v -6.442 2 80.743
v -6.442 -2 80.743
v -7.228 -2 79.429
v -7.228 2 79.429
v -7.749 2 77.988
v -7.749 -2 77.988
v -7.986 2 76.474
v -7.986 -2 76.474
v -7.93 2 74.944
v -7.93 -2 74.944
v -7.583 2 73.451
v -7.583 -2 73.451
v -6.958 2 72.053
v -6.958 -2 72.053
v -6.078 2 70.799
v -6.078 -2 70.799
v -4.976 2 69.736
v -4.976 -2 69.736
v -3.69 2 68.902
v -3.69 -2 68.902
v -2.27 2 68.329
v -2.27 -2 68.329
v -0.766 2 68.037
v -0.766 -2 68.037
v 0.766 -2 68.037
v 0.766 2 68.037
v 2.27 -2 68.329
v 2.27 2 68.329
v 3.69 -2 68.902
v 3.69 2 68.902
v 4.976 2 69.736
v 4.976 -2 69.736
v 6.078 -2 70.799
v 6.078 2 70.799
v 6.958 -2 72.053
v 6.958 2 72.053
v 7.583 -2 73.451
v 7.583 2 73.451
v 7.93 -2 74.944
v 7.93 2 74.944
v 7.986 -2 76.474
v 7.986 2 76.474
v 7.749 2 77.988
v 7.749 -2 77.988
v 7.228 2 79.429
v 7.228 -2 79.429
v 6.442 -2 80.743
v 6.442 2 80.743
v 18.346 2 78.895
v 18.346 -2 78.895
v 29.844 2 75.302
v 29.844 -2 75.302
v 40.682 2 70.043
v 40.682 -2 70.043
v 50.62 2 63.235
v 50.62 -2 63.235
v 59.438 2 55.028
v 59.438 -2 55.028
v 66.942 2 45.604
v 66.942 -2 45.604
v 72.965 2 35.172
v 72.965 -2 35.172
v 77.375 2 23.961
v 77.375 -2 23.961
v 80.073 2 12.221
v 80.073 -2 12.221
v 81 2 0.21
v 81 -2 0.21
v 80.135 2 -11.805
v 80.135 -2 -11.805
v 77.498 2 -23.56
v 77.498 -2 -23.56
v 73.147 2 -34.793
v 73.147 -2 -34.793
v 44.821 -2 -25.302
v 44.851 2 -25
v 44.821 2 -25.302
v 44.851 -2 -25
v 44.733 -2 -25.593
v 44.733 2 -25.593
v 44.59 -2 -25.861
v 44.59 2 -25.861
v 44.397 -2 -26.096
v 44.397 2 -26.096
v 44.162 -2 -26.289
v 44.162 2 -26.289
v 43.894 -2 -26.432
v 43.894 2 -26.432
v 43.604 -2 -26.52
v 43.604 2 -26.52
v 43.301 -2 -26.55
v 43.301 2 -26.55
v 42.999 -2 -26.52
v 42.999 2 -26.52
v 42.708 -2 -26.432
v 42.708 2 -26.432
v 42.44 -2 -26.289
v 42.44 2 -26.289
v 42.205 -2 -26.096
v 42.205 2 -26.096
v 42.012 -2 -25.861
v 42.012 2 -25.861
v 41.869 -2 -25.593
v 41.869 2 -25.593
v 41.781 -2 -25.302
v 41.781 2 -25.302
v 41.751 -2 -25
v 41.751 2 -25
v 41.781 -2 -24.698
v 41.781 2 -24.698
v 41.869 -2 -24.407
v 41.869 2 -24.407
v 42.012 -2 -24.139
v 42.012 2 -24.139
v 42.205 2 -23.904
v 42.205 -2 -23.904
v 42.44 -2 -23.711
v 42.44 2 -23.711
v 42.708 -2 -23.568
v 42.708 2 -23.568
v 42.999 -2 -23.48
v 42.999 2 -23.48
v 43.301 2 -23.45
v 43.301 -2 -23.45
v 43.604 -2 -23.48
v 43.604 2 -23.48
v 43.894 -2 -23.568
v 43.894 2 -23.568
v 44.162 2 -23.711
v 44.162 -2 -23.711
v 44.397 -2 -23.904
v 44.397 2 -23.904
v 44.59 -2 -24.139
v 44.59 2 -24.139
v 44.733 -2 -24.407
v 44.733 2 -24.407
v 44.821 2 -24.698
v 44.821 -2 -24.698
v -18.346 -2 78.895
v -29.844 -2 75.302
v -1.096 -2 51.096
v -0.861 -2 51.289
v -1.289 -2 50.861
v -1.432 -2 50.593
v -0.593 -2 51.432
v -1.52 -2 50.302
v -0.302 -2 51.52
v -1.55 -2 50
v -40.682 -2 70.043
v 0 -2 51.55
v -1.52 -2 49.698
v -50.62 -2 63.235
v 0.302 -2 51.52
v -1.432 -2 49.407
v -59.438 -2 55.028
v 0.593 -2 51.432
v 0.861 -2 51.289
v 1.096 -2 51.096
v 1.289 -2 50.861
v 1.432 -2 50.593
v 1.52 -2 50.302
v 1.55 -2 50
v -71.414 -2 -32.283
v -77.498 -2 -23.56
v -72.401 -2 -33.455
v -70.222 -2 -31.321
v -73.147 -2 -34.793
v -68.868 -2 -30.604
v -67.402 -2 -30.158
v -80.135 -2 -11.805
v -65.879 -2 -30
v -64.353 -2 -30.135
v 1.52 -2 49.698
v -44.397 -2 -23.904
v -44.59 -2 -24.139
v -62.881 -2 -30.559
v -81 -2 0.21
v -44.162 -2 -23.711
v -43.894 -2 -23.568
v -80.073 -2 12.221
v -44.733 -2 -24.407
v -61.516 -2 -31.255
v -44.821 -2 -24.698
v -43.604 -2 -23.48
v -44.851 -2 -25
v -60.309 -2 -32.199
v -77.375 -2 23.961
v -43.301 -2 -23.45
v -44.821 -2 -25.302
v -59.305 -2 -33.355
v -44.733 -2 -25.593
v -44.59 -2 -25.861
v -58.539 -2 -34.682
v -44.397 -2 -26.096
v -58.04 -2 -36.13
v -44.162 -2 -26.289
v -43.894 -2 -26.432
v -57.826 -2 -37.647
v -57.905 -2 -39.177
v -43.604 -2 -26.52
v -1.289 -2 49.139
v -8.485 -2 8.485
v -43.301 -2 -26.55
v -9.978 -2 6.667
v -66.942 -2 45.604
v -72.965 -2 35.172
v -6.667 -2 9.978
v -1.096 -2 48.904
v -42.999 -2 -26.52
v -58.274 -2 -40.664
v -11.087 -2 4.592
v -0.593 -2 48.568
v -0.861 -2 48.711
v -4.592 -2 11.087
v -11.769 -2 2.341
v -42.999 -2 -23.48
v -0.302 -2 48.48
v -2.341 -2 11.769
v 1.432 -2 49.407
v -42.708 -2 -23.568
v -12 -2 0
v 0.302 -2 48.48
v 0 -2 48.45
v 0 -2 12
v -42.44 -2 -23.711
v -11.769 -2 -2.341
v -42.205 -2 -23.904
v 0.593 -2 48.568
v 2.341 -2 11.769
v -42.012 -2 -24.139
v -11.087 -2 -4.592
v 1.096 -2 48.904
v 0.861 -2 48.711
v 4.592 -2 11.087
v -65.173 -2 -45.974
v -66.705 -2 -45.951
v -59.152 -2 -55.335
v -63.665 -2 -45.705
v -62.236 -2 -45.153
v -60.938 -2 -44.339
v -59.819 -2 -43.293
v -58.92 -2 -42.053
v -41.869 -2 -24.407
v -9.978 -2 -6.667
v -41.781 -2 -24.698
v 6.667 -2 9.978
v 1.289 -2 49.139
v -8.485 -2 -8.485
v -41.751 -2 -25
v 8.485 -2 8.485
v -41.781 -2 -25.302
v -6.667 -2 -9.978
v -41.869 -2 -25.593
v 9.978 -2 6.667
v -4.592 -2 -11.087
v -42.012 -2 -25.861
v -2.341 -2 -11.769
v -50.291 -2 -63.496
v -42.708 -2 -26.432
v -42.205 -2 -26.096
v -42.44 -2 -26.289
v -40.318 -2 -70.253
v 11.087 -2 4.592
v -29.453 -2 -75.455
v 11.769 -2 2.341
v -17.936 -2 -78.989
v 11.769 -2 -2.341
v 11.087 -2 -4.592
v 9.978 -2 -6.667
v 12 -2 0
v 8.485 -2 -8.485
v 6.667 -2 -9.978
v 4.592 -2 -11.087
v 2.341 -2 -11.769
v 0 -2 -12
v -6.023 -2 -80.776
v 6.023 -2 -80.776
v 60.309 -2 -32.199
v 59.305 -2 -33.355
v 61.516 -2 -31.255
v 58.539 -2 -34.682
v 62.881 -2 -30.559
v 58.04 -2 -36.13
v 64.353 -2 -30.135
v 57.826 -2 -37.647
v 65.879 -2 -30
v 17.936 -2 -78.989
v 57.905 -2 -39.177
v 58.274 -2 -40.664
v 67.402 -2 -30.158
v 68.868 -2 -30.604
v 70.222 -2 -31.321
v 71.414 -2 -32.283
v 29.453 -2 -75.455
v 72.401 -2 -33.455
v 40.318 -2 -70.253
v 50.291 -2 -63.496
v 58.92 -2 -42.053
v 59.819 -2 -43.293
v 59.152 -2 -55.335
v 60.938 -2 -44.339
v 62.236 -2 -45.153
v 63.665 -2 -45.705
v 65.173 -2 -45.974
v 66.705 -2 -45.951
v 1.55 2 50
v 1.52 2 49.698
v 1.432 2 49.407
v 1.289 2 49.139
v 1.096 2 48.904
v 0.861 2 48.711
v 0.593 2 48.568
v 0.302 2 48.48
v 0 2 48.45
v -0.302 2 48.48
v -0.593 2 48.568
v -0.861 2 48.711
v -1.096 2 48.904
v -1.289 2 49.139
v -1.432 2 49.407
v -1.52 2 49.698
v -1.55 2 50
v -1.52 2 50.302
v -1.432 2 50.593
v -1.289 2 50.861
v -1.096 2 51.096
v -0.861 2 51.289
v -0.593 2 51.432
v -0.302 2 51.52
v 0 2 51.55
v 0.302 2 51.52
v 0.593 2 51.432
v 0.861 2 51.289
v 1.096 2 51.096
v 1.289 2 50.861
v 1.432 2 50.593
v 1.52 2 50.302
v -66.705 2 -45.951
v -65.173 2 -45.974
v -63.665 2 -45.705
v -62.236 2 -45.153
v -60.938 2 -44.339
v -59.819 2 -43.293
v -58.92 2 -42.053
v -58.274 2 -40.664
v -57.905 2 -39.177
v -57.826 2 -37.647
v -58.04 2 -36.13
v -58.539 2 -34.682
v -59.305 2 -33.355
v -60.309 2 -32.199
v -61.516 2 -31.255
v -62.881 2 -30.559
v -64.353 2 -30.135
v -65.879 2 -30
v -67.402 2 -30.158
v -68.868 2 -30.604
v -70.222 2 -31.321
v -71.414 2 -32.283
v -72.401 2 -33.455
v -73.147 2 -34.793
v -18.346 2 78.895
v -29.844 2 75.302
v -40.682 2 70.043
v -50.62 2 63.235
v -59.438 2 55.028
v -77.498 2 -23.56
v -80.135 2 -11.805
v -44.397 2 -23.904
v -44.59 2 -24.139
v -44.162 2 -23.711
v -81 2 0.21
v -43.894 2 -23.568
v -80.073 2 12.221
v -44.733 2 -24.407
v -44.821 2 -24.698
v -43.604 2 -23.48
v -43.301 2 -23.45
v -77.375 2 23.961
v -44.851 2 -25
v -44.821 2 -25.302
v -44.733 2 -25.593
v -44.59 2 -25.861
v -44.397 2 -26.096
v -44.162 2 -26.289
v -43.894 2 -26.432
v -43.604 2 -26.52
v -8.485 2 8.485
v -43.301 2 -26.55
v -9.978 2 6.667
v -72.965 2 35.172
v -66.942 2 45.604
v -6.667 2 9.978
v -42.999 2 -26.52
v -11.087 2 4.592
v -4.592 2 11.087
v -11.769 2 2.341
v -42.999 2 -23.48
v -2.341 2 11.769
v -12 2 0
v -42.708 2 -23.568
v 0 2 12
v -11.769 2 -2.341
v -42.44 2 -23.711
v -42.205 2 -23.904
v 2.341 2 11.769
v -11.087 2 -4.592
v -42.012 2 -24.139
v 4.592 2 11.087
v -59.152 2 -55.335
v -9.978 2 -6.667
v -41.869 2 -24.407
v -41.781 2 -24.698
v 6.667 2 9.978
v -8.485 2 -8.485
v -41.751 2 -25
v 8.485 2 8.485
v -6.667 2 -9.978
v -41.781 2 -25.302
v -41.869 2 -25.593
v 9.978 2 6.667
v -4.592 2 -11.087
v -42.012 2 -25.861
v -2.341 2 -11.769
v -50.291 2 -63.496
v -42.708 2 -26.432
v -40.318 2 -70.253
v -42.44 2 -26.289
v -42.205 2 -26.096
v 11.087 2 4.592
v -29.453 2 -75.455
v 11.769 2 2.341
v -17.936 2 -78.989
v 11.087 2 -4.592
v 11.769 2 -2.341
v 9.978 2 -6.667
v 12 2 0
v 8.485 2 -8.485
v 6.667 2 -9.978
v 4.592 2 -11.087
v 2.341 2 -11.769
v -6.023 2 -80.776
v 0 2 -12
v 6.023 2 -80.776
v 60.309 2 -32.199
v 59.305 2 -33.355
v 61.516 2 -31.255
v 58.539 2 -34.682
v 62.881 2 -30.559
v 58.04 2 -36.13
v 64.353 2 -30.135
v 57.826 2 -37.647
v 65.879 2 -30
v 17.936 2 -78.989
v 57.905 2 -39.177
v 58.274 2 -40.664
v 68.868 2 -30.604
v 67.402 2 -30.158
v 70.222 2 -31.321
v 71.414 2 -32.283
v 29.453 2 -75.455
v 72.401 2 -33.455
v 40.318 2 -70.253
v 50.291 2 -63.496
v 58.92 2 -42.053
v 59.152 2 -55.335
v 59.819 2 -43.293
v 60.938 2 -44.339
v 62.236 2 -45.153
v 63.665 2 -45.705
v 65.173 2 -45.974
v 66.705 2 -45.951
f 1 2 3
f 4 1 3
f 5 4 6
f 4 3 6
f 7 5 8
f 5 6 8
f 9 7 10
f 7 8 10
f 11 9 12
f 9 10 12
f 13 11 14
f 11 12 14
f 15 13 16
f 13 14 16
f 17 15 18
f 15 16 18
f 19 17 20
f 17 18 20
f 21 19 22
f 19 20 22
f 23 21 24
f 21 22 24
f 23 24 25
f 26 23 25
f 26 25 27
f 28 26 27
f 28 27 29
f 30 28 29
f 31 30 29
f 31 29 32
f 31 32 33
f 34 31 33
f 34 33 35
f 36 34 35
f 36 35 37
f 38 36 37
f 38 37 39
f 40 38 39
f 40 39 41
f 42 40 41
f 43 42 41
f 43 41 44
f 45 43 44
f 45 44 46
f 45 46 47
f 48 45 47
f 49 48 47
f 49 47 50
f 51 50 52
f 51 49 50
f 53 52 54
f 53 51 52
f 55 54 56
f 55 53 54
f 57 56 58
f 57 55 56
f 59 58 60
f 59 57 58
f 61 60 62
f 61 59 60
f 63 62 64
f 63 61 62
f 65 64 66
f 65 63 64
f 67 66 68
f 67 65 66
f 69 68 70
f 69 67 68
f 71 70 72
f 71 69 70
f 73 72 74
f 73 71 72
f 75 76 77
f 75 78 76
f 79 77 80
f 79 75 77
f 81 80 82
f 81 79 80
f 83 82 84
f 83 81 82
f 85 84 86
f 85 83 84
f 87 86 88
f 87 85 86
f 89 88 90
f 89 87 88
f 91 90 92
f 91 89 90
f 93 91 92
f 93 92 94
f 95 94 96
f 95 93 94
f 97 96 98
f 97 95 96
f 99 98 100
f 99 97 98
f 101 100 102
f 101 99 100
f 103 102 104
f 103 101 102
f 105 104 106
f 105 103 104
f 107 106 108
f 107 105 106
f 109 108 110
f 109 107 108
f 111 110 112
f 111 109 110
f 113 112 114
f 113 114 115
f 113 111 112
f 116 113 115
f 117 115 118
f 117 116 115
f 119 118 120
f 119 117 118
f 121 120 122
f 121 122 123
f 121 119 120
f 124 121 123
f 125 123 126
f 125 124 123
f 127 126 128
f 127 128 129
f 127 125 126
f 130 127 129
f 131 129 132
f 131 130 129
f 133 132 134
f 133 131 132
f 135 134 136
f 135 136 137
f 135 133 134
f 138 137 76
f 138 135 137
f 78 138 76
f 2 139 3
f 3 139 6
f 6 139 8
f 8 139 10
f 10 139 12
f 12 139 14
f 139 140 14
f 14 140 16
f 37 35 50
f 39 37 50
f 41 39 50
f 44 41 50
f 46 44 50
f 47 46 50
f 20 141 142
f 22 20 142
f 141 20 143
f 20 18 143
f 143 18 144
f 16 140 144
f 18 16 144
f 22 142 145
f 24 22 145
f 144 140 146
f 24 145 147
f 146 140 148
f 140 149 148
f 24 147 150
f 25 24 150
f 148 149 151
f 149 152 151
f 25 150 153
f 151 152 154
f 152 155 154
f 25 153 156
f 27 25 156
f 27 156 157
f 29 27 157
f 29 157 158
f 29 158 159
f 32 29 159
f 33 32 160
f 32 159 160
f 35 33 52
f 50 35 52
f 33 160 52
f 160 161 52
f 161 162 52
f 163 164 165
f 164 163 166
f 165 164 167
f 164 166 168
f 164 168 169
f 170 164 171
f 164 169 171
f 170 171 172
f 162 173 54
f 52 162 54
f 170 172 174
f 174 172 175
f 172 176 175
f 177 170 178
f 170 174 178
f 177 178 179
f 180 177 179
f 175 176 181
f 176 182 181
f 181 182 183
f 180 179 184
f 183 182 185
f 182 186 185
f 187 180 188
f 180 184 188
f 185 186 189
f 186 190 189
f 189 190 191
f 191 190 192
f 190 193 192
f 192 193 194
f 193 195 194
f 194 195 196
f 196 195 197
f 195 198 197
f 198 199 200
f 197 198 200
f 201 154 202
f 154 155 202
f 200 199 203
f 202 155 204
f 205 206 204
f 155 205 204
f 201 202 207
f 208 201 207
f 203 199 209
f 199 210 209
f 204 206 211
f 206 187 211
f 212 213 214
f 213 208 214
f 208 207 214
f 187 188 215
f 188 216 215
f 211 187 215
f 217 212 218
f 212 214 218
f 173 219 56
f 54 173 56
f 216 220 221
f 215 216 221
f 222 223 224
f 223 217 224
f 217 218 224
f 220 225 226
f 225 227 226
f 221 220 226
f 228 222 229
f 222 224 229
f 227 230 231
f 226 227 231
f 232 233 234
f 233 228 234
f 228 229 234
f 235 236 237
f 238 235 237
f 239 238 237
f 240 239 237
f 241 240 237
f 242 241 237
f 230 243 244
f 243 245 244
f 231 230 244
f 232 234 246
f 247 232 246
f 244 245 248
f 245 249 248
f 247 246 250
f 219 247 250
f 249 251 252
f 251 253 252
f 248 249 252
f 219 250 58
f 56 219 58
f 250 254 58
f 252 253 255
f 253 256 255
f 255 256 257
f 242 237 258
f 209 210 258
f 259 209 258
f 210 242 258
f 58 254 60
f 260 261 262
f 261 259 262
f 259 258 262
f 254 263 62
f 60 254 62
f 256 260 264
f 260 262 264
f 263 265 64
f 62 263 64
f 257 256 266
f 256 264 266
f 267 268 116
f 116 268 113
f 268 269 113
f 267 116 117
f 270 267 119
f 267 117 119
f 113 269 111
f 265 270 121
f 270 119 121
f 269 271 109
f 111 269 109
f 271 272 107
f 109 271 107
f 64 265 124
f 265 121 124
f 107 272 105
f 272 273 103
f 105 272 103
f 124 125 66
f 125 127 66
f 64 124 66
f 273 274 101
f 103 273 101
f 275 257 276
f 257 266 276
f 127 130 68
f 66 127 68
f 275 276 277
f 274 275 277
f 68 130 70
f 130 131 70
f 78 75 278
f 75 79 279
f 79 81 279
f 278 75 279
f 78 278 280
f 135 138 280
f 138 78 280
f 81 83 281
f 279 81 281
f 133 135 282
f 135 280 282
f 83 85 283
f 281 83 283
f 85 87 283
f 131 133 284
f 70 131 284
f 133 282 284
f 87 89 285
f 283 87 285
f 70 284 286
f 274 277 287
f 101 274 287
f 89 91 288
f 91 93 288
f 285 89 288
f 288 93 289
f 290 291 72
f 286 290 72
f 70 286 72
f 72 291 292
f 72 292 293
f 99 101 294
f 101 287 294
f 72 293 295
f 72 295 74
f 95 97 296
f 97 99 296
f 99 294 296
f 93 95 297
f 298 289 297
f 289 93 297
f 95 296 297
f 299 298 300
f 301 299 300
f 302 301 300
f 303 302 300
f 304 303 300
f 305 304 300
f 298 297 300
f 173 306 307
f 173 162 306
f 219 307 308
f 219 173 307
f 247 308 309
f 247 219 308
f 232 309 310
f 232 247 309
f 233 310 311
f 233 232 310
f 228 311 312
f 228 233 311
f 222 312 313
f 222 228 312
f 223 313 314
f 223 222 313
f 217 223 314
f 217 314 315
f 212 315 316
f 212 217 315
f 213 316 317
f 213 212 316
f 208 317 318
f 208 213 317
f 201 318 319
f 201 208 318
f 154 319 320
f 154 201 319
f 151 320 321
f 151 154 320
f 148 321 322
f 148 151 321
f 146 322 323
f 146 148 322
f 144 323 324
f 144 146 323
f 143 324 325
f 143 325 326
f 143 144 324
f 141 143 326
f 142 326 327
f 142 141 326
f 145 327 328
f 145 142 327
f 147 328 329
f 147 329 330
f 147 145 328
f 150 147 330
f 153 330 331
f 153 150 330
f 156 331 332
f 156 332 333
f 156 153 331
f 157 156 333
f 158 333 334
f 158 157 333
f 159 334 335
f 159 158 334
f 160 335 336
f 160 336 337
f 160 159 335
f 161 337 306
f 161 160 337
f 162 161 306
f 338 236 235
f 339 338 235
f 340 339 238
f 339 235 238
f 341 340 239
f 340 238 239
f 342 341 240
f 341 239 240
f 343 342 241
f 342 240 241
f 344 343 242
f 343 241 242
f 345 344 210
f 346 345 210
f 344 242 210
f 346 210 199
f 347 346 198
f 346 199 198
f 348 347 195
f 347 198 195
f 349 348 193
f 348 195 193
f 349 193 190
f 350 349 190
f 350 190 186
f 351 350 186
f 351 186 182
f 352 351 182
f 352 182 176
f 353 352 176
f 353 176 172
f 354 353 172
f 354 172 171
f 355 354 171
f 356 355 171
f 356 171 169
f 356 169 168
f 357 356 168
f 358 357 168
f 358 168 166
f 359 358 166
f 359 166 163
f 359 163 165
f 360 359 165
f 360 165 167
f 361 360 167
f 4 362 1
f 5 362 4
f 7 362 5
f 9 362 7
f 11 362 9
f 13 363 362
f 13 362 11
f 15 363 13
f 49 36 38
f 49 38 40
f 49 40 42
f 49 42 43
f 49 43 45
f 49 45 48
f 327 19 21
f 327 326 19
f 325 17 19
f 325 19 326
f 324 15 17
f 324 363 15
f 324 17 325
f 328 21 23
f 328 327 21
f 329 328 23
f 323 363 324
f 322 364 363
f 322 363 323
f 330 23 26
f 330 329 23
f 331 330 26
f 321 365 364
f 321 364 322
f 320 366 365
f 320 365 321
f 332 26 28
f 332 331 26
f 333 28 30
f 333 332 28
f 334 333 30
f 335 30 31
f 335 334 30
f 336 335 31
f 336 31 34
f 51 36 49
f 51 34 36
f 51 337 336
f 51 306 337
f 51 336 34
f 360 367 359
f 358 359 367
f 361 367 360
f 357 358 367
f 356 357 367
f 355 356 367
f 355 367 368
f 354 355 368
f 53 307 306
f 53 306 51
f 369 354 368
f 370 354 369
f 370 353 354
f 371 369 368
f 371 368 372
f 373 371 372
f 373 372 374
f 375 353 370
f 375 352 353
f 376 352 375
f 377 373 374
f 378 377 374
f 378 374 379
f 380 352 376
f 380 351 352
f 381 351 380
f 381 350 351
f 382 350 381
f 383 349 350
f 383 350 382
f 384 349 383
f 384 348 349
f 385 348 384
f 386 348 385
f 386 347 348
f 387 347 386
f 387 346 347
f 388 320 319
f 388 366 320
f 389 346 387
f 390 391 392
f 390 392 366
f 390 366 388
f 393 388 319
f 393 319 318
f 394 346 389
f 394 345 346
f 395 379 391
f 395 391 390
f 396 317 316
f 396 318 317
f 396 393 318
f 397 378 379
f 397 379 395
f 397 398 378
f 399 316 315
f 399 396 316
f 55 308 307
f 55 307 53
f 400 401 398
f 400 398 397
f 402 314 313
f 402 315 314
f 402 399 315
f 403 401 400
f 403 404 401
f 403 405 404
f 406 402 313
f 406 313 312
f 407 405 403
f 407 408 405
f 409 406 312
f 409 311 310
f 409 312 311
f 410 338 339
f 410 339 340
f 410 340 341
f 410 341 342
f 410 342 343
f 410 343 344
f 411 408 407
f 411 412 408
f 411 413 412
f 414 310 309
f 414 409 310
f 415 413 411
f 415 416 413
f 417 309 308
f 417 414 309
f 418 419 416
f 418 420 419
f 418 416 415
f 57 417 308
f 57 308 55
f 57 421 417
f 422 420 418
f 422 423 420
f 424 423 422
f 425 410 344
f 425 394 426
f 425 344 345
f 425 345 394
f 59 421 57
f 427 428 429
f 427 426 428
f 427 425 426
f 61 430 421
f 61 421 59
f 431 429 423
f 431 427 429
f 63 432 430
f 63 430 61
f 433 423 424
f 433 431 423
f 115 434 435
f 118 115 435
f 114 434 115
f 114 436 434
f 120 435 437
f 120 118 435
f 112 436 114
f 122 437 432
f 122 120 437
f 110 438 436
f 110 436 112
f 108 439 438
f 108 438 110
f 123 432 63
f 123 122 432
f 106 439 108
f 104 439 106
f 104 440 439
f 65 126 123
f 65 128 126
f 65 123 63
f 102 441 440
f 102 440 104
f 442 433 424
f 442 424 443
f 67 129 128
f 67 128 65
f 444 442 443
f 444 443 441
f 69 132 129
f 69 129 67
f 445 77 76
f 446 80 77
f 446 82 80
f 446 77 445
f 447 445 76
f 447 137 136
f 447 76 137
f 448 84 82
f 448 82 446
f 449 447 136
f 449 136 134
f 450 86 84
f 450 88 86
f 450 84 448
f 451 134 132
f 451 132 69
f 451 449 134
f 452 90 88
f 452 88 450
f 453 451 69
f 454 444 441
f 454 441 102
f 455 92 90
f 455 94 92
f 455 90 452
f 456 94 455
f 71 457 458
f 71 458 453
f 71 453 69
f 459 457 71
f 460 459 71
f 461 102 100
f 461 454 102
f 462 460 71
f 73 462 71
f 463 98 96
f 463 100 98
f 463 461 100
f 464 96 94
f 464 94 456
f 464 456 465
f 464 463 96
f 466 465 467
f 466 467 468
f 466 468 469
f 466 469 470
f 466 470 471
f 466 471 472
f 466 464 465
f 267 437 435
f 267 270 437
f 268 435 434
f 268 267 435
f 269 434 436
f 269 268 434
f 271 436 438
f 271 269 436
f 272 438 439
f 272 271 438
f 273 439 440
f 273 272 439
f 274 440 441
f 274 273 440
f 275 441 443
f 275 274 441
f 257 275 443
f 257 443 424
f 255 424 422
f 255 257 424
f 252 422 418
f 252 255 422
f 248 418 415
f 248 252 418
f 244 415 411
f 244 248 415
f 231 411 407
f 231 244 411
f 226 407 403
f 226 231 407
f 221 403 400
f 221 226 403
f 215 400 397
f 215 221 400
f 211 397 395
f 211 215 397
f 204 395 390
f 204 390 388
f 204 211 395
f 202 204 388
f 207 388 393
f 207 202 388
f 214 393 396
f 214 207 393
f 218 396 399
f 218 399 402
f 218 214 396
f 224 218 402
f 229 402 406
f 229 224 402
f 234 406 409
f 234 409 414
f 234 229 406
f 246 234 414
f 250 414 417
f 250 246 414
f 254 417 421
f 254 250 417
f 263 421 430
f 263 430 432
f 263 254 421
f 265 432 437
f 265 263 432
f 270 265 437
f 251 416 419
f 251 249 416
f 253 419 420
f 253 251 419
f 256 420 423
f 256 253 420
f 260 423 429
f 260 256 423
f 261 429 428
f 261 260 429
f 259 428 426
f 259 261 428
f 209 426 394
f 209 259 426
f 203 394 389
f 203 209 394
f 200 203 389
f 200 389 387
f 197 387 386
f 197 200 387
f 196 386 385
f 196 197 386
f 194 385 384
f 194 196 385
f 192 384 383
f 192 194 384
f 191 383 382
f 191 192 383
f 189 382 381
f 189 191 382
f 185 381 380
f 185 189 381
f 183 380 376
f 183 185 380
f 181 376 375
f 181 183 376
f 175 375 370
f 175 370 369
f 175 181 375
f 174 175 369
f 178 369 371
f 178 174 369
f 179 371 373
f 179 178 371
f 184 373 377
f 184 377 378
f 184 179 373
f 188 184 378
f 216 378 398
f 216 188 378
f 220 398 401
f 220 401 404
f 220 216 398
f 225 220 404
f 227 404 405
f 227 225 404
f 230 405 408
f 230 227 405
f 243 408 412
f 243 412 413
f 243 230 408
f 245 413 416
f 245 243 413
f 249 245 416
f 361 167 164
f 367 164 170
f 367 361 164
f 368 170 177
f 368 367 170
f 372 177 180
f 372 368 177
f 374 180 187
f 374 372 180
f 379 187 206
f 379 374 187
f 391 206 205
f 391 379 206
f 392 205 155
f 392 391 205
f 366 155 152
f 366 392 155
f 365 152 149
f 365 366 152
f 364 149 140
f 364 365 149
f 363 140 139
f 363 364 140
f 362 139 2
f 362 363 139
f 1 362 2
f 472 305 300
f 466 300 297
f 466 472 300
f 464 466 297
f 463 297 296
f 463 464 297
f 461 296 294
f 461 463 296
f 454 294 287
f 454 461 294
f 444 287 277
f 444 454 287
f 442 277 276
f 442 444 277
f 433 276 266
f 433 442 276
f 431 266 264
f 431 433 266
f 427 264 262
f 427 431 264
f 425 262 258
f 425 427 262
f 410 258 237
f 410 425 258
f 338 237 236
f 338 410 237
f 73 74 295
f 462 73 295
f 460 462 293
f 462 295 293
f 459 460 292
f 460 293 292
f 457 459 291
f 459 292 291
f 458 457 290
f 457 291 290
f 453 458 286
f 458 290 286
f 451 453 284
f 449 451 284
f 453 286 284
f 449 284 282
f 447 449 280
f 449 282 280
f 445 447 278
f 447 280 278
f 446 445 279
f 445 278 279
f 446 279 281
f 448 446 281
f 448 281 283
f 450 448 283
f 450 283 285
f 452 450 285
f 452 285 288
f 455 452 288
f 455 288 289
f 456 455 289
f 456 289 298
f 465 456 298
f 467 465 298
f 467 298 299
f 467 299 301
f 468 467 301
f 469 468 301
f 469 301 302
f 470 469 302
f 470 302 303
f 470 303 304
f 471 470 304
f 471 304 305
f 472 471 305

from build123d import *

# Parameters (mm, degrees)
SKETCH1_R           = 81
SKETCH1_R_2         = 1.55
SKETCH1_R_3         = 12
BOSS_EXTRUDE1_DEPTH = 2
CUT_EXTRUDE1_DEPTH  = 5


with BuildPart() as part:
    # Sketch1 → Boss-Extrude1 (new body, symmetric)
    with BuildSketch(Plane(origin=(0, 0, 0), x_dir=(1, 0, 0), z_dir=(0, 1, 0))):
        Circle(SKETCH1_R)
        with Locations((43.301270189, 25)):
            Circle(SKETCH1_R_2, mode=Mode.SUBTRACT)
        with Locations((0, -50)):
            Circle(SKETCH1_R_2, mode=Mode.SUBTRACT)
        with Locations((-43.301270189, 25)):
            Circle(SKETCH1_R_2, mode=Mode.SUBTRACT)
        Circle(SKETCH1_R_3, mode=Mode.SUBTRACT)
    extrude(amount=BOSS_EXTRUDE1_DEPTH, both=True)

    # Sketch2 → Cut-Extrude1 (cut, through all)
    with BuildSketch(Plane.XZ.offset(2)):
        with BuildLine():
            ThreePointArc((-66.704830818, -45.950686018), (-58.889727457, -34), (-73.146876822, -34.792735035))
            ThreePointArc((-73.146876822, -34.792735035), (-70.148057707, -40.5), (-66.704830818, -45.950686018))
        make_face()
        with BuildLine():
            ThreePointArc((66.704830818, -45.950686018), (70.148057707, -40.5), (73.146876822, -34.792735035))
            ThreePointArc((73.146876822, -34.792735035), (58.889727457, -34), (66.704830818, -45.950686018))
        make_face()
        with BuildLine():
            ThreePointArc((-6.442046004, 80.743421053), (0, 68), (6.442046004, 80.743421053))
            ThreePointArc((6.442046004, 80.743421053), (0, 81), (-6.442046004, 80.743421053))
        make_face()
    extrude(amount=-CUT_EXTRUDE1_DEPTH, mode=Mode.SUBTRACT)


solid = part.part
